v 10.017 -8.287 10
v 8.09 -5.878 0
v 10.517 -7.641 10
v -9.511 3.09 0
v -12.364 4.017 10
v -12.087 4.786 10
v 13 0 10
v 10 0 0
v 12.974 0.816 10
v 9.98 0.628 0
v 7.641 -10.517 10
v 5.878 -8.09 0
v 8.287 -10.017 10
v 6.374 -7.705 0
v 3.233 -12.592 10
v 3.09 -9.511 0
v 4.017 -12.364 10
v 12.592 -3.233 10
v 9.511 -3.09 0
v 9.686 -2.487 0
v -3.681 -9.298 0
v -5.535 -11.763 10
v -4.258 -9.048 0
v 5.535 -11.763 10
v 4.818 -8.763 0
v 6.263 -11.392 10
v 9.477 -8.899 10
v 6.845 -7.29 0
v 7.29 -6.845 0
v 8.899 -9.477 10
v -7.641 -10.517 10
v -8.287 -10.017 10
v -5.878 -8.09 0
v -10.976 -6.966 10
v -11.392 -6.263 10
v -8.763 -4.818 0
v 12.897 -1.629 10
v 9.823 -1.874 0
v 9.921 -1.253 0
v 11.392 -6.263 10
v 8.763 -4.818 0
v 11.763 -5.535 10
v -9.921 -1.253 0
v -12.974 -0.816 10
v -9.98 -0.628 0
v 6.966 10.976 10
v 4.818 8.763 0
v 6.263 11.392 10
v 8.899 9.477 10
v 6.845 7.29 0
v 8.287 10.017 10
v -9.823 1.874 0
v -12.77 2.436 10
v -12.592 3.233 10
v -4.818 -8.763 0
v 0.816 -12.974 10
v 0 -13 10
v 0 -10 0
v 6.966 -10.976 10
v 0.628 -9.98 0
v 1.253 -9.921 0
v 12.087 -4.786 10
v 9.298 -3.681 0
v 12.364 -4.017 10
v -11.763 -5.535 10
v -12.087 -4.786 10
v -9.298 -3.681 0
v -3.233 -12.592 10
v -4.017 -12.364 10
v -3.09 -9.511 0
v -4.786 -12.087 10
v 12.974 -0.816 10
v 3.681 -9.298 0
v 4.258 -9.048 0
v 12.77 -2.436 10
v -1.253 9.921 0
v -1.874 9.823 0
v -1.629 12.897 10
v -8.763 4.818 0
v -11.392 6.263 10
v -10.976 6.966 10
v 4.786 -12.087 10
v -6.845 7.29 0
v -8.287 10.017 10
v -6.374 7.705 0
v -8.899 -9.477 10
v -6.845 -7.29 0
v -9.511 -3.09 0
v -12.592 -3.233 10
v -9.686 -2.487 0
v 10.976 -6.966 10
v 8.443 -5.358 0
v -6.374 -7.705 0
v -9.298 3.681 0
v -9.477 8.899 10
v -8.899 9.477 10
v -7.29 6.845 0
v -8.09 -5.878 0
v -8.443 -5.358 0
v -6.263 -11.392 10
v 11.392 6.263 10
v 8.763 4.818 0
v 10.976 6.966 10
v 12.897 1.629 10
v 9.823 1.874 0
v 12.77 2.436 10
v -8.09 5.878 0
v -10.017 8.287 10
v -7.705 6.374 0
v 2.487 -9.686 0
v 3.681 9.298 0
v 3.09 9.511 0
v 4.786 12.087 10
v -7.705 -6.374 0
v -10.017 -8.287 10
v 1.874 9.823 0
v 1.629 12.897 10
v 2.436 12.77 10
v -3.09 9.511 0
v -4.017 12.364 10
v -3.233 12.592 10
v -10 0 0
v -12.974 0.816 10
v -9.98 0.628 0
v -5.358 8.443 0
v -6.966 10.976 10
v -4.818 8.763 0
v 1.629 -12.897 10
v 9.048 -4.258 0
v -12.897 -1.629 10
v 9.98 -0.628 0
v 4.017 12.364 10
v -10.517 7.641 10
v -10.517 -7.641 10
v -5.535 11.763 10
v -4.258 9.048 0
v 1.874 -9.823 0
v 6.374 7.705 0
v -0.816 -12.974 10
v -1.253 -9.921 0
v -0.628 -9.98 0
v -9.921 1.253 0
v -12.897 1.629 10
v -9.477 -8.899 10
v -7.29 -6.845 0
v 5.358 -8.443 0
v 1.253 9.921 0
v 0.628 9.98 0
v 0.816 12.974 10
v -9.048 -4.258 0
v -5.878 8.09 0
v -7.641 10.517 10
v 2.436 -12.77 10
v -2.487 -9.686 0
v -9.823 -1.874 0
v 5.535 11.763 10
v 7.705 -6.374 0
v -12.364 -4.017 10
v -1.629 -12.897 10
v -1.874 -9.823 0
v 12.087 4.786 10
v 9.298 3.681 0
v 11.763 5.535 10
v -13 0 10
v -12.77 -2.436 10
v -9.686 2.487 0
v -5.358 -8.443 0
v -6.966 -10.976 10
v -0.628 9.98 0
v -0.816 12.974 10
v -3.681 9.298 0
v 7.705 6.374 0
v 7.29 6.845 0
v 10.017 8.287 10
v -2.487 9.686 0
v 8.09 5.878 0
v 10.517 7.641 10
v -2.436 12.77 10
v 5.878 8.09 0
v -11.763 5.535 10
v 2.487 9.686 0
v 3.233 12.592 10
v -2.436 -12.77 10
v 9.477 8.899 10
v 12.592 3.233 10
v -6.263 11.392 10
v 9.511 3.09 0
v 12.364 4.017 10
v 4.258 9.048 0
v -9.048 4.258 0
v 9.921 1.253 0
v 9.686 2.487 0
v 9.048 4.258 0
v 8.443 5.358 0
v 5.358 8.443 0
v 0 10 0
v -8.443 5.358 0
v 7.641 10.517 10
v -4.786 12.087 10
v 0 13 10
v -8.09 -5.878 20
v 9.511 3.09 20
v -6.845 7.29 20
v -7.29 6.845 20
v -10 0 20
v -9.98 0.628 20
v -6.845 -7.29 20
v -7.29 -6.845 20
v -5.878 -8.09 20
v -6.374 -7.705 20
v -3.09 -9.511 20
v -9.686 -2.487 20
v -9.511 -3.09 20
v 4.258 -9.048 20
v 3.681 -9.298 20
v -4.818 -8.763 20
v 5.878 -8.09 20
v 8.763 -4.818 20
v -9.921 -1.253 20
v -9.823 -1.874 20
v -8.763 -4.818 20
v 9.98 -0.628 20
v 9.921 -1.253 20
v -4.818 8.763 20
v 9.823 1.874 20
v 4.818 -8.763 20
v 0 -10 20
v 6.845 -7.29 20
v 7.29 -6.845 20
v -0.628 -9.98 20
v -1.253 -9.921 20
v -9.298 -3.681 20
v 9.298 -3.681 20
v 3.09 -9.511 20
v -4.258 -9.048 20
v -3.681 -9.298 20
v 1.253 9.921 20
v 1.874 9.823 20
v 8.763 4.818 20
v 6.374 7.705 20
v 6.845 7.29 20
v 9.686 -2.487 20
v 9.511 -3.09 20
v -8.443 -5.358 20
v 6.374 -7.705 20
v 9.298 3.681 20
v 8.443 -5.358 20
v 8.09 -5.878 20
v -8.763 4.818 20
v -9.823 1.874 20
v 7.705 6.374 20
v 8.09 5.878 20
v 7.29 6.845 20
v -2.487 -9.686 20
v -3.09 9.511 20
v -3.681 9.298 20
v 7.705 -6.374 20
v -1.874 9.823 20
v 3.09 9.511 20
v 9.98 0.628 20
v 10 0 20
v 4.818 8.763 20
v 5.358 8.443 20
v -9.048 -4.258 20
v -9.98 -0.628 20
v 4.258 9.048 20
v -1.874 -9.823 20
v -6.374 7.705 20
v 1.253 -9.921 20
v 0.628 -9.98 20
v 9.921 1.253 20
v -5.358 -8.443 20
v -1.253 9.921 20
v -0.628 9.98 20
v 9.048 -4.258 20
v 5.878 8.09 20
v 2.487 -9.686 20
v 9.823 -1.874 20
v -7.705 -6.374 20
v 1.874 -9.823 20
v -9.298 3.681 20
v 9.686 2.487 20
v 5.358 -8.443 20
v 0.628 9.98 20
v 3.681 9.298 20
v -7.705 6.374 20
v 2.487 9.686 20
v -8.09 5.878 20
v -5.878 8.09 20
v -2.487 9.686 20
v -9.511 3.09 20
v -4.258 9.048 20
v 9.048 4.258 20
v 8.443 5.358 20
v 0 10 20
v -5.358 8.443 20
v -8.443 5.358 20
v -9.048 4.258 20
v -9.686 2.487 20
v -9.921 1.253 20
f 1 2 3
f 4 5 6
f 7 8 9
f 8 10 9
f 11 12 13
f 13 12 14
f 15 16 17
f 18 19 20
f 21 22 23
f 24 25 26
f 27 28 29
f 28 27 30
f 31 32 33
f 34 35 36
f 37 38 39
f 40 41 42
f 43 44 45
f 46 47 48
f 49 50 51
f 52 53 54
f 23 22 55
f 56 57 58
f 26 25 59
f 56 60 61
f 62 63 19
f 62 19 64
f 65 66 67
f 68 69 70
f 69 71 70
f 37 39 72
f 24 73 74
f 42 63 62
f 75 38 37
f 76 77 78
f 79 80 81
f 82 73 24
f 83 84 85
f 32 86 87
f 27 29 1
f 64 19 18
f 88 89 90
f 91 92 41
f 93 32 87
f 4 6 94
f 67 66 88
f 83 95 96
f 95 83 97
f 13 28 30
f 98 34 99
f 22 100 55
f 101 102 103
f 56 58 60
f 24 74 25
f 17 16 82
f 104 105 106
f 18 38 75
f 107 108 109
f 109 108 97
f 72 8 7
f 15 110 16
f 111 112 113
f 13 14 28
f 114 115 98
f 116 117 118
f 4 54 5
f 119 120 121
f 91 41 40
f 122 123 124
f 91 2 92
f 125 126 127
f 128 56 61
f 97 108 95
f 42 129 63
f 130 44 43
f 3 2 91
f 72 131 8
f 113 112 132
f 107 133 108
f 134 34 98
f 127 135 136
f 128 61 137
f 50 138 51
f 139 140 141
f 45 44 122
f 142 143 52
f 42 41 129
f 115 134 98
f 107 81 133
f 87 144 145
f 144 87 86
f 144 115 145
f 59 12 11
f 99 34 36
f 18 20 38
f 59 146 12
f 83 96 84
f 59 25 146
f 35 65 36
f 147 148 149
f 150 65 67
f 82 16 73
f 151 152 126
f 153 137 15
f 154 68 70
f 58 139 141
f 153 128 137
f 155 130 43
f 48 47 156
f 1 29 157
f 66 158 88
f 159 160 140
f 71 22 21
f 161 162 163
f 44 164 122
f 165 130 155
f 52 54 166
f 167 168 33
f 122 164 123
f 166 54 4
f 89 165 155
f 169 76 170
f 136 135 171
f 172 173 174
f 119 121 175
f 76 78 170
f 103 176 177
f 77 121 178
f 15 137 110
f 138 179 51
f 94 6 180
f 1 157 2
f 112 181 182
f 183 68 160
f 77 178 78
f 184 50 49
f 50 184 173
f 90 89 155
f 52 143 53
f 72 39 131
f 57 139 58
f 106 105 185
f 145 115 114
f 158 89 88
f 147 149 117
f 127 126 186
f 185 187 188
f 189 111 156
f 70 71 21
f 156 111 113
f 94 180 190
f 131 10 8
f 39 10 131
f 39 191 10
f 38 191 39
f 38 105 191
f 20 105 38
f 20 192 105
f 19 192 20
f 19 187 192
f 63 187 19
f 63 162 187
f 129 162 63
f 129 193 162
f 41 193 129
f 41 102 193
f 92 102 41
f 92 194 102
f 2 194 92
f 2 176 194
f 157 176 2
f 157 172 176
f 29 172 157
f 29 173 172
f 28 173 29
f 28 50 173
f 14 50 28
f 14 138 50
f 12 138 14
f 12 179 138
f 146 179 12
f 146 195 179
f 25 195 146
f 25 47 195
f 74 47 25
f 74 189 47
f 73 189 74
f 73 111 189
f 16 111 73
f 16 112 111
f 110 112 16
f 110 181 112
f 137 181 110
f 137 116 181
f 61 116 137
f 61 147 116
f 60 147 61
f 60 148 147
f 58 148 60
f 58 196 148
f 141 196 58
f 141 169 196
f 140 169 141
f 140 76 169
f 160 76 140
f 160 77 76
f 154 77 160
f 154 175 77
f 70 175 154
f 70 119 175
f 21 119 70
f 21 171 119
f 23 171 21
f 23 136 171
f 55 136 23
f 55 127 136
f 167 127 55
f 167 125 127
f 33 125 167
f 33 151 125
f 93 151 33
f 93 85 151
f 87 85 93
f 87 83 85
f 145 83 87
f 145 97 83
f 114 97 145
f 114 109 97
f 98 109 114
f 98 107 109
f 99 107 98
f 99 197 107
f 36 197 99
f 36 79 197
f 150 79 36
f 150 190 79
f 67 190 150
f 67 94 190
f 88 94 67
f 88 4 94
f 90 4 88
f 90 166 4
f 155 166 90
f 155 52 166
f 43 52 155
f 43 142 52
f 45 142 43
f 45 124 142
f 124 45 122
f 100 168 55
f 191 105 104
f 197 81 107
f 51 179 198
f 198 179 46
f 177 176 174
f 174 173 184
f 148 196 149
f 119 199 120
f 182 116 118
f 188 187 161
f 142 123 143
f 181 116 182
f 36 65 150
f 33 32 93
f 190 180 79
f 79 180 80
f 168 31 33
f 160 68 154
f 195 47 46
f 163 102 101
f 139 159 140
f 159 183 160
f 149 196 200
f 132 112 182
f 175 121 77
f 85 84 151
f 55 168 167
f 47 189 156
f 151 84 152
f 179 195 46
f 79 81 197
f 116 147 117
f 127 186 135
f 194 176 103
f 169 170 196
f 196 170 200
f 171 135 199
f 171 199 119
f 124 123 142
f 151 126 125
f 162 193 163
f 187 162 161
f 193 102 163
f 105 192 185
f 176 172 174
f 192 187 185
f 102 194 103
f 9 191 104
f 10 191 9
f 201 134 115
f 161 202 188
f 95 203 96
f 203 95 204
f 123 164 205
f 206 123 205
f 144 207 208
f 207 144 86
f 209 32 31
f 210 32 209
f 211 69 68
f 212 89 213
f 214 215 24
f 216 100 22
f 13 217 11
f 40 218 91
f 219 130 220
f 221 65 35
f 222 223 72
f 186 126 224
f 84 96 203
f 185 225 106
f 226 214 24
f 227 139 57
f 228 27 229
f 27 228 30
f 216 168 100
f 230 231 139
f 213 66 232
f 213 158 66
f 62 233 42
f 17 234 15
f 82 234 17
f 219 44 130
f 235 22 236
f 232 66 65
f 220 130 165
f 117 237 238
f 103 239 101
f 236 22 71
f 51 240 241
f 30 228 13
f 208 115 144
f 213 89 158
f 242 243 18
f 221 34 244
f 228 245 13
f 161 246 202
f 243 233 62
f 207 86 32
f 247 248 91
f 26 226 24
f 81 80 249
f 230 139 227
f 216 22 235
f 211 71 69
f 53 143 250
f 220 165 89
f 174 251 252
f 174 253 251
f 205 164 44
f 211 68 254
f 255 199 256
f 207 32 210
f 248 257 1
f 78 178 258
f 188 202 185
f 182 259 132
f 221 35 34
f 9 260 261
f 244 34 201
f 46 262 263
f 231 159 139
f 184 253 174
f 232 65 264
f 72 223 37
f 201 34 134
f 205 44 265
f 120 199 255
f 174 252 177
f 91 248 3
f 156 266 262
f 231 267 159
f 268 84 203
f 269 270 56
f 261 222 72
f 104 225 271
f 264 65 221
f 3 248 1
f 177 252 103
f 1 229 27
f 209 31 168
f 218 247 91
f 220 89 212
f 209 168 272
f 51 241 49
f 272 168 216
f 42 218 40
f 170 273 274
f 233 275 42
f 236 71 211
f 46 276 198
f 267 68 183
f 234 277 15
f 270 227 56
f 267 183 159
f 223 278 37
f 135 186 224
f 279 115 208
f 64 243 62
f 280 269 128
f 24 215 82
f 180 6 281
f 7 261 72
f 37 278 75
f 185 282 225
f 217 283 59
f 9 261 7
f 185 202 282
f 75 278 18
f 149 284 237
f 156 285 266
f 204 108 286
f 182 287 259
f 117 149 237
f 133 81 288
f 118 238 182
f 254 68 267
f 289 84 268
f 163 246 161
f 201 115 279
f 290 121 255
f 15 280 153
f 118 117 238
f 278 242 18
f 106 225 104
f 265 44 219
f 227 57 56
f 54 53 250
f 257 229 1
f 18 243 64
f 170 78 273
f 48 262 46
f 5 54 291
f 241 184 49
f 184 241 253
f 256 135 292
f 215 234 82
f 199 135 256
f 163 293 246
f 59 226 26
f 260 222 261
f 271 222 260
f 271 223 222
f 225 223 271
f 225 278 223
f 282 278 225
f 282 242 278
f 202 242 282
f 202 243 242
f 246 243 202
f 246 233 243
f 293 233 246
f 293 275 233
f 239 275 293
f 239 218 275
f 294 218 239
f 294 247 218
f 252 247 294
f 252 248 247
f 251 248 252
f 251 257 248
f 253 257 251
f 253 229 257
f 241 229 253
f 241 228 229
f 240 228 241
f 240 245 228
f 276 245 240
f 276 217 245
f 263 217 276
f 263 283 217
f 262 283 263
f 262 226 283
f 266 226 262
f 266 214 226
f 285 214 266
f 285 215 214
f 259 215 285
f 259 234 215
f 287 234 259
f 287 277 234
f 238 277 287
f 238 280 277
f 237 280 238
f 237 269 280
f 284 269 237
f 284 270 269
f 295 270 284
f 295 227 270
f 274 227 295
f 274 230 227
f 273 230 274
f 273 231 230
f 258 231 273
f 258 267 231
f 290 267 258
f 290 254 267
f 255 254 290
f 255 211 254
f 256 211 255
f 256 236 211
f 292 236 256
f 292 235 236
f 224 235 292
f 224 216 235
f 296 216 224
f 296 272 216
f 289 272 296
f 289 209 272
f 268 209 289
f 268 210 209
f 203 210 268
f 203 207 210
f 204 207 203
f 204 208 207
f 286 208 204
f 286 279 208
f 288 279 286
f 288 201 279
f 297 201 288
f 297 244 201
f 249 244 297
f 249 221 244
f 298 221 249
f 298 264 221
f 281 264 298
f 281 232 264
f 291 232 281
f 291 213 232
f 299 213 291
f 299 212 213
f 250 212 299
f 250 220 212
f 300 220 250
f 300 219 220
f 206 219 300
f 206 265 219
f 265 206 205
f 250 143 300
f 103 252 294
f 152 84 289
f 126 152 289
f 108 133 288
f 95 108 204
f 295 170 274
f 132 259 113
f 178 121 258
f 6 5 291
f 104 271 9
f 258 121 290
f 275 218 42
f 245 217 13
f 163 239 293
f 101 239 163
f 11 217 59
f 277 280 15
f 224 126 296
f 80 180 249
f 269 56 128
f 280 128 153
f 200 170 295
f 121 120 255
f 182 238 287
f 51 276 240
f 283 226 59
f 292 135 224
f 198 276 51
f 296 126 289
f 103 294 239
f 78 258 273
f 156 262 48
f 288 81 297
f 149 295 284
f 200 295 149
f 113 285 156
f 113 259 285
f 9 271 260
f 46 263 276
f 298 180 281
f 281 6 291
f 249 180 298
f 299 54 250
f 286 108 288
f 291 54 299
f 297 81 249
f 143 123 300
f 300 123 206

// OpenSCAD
/*
Ceaser Codex:
2 wheels of 26 letters
conical extrusions...?

*/
$fn = 100;
h = 10;
//make v shaped cylinders
aLow = 10;
ahig = 13;
blow = ahig;
bhig = aLow;

cylinder(h,aLow,ahig);
rotate([0,180,0])
translate([0,0,2*-aLow])
cylinder(h,aLow,ahig);
